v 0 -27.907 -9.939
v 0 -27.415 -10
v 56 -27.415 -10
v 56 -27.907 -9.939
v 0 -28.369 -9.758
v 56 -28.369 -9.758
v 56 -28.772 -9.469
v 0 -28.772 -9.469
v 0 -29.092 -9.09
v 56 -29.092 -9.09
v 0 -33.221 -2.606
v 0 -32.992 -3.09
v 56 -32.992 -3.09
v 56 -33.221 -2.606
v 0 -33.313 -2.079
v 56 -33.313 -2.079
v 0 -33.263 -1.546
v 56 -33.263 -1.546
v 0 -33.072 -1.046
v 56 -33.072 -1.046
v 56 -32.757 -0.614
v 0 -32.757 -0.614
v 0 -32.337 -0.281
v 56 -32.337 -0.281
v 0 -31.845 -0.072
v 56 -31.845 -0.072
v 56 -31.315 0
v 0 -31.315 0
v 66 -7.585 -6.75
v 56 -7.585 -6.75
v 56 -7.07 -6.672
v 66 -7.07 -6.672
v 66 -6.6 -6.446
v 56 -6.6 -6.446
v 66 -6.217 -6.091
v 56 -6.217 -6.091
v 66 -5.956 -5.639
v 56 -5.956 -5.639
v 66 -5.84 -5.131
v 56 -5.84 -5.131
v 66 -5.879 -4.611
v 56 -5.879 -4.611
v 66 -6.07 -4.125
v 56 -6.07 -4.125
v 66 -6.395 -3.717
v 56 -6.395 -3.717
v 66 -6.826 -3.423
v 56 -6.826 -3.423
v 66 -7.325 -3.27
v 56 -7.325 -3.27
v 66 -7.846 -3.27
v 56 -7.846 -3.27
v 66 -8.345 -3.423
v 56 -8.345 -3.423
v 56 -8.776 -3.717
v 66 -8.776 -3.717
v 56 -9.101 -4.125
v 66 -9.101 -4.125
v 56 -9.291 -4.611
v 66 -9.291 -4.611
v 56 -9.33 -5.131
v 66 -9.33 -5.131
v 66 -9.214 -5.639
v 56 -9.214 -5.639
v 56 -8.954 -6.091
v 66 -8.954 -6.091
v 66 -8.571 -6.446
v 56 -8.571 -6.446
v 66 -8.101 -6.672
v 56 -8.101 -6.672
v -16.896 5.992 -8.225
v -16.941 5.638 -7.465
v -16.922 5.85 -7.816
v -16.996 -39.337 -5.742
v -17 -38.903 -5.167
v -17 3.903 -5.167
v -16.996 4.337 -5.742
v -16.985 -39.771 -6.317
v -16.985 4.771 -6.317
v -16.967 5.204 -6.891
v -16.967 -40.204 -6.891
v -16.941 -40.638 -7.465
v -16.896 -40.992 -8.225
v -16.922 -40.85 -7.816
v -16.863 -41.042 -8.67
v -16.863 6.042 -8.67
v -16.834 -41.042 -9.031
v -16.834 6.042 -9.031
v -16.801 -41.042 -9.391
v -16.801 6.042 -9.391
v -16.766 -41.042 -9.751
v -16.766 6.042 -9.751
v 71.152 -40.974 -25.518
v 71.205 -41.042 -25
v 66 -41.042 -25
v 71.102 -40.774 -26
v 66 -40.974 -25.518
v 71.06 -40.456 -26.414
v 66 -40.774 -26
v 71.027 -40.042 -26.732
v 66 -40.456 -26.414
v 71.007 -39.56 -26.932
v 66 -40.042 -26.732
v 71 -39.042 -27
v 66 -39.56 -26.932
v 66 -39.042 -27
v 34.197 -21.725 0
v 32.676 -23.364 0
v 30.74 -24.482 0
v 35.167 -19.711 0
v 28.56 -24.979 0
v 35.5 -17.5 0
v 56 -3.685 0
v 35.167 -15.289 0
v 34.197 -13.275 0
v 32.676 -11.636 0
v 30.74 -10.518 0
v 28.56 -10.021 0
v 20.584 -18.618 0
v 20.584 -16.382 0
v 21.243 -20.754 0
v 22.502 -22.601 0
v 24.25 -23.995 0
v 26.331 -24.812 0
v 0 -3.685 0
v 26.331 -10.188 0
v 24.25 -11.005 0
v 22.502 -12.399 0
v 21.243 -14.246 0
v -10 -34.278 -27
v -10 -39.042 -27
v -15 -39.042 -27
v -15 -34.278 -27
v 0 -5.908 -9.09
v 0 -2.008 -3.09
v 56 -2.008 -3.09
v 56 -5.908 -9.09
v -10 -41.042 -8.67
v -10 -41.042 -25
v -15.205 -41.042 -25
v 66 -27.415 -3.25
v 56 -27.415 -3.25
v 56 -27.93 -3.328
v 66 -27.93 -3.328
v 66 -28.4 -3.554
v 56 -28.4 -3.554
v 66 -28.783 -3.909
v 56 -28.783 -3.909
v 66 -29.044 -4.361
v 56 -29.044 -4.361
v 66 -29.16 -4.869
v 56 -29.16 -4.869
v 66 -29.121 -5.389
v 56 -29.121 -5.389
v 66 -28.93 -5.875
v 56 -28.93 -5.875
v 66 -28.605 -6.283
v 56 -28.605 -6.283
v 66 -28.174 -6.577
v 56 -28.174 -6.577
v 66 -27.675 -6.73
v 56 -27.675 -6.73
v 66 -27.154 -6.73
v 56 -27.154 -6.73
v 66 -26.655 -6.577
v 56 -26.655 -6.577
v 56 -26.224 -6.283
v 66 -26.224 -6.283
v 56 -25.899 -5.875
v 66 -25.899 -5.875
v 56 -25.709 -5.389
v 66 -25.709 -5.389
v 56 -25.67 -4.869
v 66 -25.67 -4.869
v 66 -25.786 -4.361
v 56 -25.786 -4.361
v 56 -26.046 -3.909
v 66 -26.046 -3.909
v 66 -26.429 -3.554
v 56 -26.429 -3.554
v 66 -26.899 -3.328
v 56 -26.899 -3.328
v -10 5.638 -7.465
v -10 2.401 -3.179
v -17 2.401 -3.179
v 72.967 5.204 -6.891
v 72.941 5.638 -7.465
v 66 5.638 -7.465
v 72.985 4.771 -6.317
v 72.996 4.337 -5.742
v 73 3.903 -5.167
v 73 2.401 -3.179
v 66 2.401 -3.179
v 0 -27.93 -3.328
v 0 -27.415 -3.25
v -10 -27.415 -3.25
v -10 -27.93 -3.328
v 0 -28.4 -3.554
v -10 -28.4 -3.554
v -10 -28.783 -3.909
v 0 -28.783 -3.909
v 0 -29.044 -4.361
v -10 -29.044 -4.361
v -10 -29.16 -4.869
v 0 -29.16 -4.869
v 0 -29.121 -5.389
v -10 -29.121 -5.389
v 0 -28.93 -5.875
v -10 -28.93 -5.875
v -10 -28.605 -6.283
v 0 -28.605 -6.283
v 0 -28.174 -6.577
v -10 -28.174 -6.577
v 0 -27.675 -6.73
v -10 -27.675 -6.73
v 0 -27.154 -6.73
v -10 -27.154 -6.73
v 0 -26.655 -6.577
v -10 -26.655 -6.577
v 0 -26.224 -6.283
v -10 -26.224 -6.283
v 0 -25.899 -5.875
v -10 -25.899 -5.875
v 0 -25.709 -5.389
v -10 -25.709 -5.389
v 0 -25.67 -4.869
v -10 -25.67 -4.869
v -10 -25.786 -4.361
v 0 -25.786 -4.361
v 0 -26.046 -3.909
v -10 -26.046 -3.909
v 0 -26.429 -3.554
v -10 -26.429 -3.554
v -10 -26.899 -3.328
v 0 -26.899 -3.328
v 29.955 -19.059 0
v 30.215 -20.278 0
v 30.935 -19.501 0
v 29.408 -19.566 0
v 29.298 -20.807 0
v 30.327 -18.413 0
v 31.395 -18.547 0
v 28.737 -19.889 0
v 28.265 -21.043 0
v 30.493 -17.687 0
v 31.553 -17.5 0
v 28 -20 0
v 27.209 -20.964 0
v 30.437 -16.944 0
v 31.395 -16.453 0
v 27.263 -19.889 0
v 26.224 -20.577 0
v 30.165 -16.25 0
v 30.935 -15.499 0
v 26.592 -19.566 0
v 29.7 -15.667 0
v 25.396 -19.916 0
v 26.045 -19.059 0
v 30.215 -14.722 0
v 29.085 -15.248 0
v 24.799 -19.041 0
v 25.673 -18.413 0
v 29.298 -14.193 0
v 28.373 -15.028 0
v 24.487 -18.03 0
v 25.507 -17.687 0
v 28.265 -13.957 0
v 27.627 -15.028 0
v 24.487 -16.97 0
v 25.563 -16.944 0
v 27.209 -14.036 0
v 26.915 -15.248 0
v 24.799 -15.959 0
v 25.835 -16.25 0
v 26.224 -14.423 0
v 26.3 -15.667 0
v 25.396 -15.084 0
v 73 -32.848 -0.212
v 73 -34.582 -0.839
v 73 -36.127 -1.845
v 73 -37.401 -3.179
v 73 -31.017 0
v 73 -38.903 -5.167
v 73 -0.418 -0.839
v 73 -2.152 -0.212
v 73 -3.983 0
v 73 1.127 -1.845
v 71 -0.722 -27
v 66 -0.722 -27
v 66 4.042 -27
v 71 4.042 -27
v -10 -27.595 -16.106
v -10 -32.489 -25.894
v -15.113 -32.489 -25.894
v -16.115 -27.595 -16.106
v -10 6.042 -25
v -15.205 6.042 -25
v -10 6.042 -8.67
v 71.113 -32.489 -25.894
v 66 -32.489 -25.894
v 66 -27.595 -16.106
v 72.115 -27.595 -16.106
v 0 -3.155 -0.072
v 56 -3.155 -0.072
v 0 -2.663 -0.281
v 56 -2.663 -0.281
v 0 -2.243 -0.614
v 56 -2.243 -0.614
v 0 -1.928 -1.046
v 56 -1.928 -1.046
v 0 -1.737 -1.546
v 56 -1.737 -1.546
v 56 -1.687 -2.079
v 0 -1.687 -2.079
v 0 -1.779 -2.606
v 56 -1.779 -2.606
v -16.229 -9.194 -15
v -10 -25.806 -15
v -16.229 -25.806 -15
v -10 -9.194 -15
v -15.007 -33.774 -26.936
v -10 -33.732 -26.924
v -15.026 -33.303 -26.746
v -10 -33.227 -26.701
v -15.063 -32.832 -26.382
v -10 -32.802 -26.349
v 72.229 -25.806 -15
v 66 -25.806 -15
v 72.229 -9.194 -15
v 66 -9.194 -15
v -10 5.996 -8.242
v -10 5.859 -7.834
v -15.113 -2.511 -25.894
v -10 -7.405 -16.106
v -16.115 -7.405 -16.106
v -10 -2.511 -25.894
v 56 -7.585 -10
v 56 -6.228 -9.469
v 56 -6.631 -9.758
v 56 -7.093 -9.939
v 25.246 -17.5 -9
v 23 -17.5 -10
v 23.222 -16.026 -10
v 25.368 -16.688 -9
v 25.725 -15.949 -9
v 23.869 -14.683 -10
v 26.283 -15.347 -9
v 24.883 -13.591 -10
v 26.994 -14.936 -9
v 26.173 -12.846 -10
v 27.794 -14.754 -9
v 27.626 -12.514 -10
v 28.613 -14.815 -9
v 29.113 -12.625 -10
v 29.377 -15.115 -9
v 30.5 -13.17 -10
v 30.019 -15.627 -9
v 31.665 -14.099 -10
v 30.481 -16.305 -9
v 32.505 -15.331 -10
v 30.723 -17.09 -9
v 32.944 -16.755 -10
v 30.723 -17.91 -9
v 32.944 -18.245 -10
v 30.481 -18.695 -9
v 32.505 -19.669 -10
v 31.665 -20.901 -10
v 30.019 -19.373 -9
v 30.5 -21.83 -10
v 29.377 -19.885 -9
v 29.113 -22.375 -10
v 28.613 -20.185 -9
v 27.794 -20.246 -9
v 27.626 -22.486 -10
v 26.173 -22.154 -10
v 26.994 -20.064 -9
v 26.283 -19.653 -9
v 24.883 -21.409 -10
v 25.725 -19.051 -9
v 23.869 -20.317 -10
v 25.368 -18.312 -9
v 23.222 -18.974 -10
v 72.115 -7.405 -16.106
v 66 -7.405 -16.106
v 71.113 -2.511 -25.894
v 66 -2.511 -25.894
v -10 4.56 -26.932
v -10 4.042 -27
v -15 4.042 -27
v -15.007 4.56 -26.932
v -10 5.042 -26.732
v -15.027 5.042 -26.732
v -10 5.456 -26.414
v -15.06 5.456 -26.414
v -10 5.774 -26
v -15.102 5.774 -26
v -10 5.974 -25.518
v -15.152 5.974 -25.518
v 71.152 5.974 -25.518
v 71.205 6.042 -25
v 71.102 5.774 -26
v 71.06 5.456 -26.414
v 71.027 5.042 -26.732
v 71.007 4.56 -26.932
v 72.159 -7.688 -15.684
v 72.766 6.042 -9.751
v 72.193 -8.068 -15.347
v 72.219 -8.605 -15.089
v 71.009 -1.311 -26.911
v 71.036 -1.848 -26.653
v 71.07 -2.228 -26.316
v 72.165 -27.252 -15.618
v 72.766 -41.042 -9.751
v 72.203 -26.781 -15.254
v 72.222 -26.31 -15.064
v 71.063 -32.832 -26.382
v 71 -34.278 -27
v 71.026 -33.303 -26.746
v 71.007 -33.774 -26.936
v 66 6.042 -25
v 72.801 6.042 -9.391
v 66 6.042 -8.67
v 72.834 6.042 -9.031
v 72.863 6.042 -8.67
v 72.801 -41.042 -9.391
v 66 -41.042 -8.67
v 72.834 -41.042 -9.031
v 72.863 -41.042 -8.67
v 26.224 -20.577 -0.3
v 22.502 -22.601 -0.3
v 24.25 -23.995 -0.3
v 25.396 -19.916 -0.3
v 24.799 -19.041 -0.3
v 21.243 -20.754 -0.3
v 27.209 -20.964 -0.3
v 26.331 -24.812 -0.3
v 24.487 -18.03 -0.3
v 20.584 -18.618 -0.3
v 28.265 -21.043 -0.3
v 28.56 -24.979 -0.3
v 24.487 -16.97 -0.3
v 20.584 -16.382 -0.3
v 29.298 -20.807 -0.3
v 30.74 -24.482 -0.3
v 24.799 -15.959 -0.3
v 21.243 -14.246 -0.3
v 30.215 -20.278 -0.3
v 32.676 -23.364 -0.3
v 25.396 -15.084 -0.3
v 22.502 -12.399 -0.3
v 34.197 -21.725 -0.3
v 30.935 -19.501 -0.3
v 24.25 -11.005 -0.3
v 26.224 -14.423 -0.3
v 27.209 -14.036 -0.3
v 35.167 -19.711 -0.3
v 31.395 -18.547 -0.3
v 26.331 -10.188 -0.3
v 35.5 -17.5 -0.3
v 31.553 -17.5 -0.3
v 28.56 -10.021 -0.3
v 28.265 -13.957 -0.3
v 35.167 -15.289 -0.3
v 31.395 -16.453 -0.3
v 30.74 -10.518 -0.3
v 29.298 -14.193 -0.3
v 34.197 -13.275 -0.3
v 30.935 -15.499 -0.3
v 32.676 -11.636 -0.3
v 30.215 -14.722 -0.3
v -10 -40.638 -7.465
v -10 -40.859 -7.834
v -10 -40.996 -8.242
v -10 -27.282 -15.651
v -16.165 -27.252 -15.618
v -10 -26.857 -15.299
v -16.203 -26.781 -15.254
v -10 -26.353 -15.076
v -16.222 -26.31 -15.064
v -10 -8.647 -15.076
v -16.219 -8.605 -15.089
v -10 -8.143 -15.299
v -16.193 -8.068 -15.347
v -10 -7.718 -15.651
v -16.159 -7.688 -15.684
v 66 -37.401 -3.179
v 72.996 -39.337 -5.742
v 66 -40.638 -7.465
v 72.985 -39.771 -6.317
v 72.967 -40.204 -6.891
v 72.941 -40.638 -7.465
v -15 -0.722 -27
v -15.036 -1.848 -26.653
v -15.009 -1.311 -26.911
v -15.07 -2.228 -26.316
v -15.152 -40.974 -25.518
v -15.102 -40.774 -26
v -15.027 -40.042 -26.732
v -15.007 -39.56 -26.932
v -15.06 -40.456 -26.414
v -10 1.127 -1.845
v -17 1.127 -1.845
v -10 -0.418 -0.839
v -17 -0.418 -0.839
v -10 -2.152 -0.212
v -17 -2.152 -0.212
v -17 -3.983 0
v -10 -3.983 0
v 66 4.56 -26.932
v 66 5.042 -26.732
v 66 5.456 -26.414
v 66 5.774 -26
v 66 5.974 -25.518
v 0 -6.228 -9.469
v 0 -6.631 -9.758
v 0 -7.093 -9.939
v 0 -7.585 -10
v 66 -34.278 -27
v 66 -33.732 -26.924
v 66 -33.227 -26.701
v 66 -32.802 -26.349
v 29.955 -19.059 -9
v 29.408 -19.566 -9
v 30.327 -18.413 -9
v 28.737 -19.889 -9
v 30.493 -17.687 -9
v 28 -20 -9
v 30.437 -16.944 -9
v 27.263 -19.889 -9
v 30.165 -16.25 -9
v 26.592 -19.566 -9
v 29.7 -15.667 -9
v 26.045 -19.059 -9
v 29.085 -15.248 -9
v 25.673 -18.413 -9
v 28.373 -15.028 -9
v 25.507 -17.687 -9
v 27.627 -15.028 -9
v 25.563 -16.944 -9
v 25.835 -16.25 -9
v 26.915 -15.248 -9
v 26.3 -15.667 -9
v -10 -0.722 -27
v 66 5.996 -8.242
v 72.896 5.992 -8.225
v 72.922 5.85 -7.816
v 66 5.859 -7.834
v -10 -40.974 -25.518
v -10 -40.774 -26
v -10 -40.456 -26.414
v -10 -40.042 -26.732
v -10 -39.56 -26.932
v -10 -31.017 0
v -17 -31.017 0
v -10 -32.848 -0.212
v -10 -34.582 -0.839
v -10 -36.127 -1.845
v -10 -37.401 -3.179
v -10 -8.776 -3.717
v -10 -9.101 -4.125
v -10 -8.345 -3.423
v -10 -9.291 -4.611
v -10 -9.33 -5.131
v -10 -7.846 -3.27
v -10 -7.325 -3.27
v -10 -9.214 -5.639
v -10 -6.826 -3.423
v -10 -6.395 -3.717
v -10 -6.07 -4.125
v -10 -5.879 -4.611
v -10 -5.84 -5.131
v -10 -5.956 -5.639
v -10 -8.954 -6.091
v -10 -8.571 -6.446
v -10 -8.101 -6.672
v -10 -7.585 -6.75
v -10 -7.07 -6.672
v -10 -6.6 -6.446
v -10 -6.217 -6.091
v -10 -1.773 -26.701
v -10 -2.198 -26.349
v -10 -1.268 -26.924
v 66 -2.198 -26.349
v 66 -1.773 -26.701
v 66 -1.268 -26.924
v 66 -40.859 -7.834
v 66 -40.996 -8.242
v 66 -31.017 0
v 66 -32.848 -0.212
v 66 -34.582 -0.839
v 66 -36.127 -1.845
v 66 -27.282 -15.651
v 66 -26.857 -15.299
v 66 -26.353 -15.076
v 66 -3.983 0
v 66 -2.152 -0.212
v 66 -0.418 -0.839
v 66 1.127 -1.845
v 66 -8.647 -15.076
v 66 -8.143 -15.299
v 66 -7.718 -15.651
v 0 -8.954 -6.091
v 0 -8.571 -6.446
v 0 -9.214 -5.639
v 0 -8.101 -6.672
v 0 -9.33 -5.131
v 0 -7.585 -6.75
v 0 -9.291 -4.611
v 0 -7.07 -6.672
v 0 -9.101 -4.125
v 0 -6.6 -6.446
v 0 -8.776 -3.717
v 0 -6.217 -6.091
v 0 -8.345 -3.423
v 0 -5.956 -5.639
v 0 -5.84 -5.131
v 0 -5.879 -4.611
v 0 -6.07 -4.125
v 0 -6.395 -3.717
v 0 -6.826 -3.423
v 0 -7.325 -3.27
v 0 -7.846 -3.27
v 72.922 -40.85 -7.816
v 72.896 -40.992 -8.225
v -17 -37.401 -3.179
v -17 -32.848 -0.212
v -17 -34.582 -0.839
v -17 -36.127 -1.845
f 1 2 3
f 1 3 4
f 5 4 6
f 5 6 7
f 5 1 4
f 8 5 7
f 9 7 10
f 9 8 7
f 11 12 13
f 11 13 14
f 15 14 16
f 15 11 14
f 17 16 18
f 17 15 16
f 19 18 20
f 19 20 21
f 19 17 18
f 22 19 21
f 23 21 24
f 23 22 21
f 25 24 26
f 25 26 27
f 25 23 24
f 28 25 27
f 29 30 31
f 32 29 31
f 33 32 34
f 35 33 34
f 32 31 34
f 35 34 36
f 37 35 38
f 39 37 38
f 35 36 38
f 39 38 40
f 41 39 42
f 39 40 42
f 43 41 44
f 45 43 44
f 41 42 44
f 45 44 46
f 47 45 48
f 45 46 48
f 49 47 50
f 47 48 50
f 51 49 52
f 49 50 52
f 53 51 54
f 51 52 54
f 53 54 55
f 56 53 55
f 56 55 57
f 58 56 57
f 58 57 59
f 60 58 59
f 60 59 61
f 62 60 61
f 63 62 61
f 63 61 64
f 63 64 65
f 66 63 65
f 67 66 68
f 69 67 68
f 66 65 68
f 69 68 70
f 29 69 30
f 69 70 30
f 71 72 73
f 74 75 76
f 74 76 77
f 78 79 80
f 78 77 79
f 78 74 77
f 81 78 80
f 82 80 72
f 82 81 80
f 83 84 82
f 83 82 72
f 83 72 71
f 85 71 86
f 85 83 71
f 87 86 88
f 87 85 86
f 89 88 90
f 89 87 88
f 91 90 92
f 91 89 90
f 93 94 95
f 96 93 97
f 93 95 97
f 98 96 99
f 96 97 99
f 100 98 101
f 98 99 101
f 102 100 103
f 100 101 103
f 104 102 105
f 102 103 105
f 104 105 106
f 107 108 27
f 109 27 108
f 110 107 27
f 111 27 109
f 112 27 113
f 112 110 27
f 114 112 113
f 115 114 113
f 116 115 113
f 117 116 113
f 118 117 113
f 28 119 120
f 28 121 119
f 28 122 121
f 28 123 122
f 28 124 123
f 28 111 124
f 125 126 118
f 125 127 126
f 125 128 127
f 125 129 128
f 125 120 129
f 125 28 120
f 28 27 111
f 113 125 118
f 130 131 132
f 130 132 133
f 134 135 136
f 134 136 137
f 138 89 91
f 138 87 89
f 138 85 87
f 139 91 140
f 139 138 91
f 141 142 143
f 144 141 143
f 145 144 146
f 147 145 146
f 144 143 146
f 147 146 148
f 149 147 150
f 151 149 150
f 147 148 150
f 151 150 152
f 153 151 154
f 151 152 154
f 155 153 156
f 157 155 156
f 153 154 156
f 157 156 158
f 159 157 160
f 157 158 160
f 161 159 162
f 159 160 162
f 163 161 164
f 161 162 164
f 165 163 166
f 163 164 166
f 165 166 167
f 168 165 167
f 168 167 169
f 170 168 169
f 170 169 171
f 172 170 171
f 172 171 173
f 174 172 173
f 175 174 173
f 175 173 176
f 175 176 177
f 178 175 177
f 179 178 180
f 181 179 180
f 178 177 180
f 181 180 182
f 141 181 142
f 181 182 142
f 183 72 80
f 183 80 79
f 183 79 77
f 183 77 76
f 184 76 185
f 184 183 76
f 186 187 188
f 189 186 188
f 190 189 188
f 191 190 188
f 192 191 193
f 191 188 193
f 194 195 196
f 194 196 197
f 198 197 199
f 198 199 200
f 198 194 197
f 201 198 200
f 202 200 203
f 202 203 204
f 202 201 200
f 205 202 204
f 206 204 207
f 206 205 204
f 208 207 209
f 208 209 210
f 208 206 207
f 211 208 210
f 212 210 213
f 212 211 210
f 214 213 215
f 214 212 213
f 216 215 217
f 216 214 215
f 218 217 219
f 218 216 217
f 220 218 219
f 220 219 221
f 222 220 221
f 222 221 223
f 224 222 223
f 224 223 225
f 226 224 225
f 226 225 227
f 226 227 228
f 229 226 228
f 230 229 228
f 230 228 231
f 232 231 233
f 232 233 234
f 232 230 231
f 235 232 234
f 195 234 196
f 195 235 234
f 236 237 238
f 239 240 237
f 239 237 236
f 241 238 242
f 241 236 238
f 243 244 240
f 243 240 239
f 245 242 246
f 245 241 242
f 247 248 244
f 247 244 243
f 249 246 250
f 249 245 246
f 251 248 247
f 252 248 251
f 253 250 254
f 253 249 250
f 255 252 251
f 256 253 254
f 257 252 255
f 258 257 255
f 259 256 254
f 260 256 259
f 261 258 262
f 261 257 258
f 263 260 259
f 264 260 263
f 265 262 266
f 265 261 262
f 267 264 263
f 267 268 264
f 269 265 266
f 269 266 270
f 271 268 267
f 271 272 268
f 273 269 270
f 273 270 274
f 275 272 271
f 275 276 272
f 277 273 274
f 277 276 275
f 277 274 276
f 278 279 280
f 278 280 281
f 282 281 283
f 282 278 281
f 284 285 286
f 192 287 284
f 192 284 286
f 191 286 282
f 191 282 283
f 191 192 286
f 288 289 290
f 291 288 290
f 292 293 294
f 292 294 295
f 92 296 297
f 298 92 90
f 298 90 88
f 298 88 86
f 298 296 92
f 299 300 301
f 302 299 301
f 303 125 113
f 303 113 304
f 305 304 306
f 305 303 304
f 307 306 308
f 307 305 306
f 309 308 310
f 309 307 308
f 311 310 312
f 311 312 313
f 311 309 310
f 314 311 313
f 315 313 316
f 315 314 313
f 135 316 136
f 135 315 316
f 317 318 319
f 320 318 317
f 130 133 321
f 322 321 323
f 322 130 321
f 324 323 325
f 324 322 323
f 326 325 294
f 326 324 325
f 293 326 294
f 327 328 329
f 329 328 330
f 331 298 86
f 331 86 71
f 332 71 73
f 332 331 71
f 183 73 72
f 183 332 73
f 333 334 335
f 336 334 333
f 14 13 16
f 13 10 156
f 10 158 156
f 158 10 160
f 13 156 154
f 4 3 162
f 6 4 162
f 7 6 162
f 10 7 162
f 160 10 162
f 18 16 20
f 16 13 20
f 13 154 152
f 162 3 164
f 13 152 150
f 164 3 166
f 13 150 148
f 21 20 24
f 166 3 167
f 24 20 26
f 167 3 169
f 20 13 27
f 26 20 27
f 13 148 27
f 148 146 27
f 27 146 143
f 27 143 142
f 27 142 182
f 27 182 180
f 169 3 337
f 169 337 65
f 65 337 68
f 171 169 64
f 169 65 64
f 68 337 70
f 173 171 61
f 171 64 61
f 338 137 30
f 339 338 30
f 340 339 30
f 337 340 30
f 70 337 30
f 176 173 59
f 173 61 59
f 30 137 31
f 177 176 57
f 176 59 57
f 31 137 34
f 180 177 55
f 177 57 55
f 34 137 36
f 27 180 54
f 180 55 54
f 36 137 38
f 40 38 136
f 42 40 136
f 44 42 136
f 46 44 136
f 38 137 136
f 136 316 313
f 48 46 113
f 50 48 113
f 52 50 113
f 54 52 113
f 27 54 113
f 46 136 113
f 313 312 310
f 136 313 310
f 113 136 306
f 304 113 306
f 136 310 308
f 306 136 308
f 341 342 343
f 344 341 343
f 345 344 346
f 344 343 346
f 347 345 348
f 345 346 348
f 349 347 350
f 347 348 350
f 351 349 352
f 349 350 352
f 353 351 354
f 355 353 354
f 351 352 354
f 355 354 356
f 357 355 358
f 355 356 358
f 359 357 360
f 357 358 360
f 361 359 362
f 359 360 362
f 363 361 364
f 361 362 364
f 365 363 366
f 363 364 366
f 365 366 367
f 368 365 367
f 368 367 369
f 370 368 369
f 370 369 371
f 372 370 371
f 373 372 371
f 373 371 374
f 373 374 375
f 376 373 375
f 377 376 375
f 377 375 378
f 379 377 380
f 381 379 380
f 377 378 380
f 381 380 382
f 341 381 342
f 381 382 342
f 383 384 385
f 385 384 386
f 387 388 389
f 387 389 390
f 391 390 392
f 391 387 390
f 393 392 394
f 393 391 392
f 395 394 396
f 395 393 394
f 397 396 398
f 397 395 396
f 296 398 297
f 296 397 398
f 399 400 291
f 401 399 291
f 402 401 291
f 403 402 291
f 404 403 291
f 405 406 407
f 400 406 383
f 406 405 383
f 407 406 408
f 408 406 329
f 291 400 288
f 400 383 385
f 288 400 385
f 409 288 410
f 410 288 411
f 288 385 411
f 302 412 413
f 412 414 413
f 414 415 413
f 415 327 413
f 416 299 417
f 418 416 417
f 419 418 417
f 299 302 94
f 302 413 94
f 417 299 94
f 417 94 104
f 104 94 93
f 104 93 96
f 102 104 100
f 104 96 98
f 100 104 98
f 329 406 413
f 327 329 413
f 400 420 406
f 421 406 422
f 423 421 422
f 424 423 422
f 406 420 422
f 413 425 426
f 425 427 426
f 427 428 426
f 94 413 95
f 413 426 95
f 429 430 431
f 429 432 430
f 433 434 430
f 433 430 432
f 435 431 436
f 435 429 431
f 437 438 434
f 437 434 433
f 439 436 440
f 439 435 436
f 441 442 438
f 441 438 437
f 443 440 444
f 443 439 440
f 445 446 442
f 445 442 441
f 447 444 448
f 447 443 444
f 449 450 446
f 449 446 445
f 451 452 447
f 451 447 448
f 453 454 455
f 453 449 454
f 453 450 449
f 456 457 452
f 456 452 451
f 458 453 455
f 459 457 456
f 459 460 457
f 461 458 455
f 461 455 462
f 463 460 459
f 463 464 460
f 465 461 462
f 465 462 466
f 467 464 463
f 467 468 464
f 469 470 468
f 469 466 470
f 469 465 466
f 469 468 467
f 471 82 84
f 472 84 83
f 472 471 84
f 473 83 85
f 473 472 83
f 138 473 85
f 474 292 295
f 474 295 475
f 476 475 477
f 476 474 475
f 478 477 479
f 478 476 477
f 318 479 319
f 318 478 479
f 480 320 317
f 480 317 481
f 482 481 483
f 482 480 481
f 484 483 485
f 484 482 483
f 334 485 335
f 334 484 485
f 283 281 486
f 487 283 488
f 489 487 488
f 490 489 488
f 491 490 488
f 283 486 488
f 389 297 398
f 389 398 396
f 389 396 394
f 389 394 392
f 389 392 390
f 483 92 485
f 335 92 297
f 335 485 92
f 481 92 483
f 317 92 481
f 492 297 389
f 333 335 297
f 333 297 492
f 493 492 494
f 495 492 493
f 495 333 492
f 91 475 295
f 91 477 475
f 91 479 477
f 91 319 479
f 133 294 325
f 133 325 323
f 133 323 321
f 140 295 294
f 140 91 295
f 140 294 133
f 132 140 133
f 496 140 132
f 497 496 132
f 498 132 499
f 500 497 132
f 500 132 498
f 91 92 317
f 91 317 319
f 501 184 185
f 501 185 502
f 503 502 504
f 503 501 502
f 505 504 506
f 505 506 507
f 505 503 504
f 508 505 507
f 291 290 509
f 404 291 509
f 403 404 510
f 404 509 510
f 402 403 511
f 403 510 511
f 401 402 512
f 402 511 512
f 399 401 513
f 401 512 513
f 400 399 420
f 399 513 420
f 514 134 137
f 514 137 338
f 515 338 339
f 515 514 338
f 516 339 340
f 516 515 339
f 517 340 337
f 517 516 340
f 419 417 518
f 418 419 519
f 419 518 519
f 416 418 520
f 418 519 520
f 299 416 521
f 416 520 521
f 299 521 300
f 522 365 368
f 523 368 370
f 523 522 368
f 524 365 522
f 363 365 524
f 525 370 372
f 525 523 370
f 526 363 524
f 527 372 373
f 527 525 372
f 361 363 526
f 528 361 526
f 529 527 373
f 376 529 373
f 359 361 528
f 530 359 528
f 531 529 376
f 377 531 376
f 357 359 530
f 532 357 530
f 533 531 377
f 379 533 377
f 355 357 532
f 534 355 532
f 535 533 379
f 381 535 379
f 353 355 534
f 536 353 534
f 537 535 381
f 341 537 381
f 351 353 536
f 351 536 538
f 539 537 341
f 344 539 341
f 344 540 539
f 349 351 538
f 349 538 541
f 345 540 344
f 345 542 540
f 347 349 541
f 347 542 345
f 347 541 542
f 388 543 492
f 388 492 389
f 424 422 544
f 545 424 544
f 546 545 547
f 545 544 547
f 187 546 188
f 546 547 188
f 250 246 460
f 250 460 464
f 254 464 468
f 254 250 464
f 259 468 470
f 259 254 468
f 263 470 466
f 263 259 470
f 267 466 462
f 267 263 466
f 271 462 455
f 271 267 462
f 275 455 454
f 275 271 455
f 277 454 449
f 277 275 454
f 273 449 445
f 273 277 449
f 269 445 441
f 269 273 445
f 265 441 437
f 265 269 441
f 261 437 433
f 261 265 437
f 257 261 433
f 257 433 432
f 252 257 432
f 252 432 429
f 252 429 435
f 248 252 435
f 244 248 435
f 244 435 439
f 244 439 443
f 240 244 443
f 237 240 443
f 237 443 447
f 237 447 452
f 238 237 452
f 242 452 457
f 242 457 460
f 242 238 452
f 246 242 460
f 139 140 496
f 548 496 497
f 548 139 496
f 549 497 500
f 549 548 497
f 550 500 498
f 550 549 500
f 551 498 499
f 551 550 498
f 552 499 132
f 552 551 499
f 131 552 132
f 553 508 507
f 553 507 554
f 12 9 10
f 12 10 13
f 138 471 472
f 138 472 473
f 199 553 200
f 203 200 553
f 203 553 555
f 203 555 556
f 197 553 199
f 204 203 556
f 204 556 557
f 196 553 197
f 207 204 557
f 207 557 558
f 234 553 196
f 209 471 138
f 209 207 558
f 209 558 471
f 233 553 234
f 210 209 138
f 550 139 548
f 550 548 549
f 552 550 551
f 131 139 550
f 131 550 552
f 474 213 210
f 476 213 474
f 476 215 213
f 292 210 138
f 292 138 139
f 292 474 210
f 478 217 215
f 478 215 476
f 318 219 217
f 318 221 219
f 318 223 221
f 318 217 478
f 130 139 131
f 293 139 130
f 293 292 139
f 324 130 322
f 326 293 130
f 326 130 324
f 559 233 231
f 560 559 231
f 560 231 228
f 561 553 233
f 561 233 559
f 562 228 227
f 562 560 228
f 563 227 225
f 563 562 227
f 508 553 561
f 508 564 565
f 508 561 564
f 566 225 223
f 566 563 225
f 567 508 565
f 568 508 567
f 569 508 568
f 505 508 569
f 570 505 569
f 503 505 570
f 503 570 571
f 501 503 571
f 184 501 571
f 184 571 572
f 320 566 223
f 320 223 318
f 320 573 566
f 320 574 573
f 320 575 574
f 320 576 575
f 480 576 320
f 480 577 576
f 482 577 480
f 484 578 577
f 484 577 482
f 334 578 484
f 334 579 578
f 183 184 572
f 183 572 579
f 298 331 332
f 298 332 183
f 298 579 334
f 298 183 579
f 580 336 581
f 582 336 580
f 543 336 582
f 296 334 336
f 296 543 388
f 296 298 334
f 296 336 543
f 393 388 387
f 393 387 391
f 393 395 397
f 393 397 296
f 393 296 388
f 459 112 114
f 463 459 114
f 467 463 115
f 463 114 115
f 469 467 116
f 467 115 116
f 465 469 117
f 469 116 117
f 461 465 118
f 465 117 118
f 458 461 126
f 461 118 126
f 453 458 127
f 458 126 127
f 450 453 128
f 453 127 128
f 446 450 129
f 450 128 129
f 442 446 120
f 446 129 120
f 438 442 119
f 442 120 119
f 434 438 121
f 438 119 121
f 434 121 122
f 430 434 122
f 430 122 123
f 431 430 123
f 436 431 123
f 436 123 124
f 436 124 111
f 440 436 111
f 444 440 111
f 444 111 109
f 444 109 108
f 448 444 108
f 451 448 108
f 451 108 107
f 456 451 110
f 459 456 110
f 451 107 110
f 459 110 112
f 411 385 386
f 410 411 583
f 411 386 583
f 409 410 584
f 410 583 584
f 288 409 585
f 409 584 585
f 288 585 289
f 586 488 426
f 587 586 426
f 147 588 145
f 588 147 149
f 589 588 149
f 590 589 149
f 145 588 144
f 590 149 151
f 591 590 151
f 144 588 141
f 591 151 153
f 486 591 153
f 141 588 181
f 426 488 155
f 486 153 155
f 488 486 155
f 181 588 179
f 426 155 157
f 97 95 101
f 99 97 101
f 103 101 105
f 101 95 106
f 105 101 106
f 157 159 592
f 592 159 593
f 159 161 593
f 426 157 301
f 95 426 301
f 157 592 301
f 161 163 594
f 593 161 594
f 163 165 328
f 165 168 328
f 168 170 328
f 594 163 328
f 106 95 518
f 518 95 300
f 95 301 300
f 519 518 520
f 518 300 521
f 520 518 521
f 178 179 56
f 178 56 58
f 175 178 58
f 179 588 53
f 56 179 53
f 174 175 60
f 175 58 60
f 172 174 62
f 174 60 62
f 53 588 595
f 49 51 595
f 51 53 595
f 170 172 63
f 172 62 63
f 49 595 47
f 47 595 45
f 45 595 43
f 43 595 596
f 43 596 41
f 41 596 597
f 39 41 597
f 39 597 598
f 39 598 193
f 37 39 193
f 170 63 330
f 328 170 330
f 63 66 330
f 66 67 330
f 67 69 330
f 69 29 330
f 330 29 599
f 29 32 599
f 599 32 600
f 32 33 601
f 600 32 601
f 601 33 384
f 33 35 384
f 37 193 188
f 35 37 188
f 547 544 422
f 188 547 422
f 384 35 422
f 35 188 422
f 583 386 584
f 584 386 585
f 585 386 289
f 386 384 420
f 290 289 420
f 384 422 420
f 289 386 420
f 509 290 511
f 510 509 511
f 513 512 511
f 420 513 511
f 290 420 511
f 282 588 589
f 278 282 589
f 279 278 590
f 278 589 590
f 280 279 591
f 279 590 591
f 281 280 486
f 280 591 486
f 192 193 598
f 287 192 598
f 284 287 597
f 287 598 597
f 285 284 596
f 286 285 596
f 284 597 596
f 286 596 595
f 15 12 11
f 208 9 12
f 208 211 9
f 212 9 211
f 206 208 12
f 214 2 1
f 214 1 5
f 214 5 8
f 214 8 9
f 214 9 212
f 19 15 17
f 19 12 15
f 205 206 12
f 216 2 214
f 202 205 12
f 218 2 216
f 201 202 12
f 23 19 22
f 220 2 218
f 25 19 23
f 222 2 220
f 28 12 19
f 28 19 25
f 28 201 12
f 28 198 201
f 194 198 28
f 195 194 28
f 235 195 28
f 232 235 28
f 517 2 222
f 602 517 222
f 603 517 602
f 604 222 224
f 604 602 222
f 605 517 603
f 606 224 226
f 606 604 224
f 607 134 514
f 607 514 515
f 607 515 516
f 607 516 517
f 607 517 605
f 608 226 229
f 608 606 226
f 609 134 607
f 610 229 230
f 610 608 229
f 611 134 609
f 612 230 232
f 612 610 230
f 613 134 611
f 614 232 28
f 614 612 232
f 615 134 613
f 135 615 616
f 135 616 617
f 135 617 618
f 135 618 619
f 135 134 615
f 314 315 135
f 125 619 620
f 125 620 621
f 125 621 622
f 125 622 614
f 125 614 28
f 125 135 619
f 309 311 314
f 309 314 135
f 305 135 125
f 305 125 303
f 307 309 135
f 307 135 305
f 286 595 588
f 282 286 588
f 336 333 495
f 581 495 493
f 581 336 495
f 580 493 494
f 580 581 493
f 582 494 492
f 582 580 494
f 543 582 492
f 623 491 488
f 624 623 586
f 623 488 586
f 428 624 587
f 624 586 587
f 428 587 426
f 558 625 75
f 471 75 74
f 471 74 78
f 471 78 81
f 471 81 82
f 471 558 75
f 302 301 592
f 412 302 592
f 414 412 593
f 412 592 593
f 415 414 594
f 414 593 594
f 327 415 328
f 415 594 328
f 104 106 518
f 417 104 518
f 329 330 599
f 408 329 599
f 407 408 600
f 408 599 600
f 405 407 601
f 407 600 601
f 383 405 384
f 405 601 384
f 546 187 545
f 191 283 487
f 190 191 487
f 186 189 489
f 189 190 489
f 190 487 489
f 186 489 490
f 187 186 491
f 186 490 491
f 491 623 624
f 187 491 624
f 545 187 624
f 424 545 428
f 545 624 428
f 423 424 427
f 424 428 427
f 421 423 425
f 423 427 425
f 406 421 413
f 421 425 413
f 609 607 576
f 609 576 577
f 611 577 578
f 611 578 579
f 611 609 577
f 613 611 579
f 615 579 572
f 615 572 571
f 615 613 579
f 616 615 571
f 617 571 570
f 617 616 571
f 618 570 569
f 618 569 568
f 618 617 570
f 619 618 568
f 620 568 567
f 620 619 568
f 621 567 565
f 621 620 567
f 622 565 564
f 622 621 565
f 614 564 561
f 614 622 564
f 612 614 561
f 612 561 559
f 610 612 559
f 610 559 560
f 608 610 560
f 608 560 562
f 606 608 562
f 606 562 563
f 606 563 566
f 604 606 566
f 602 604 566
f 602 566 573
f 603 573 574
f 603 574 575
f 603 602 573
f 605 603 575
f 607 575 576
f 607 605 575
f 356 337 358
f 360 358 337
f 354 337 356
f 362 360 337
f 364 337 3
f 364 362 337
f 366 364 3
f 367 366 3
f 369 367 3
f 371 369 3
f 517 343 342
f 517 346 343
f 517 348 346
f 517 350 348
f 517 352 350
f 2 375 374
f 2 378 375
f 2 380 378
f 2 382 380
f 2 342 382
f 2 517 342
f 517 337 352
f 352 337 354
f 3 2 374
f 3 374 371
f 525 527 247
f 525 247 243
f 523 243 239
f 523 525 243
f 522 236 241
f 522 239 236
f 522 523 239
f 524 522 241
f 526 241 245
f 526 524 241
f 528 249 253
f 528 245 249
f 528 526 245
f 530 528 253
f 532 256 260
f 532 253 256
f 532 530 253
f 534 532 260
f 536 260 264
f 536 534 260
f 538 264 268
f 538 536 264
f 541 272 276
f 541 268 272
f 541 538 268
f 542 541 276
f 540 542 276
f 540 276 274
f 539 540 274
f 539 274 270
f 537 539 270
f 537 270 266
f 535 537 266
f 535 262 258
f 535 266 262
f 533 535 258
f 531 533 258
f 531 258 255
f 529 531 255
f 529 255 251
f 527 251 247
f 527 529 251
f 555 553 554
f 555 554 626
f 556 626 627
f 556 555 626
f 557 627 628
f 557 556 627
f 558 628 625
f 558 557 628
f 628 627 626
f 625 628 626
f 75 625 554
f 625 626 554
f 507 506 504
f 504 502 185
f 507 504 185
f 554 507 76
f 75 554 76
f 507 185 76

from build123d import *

# Parameters (mm, degrees)
BOSS_EXTRUDE1_DEPTH     = 56
SKETCH2_R               = 1.75
BOSS_EXTRUDE2_DEPTH     = 10
BOSS_EXTRUDE3_DEPTH     = 7
CUT_EXTRUDE1_DEPTH      = 13
CUT_EXTRUDE1_DEPTH_BACK = 44
FILLET1_R               = 45
CUT_EXTRUDE2_DEPTH      = 44
CUT_EXTRUDE2_DEPTH_BACK = 44
SKETCH5_R               = 2.5
SKETCH6_R               = 5
CUT_EXTRUDE3_DEPTH      = 1
CUT_EXTRUDE3_DRAFT      = -66
SKETCH7_R               = 7.5
SKETCH7_R_2             = 3.552716841
CUT_EXTRUDE4_DEPTH      = 0.3


with BuildPart() as part:
    # Sketch1 → Boss-Extrude1 (new body)
    with BuildSketch(Plane(origin=(0, 0, 0), x_dir=(0, 0, -1), z_dir=(1, 0, 0))):
        with BuildLine():
            Line((3.089976701, -2.008484856), (9.089976701, -5.908484856))
            ThreePointArc((9.089976701, -5.908484856), (9.757832956, -6.631420675), (10, -7.585372088))
            Line((10, -7.585372088), (10, -27.414627912))
            ThreePointArc((10, -27.414627912), (9.757832956, -28.368579325), (9.089976701, -29.091515144))
            Line((9.089976701, -29.091515144), (3.089976701, -32.991515144))
            ThreePointArc((3.089976701, -32.991515144), (1.046048587, -33.072460868), (0, -31.314627912))
            Line((0, -31.314627912), (0, -3.685372088))
            ThreePointArc((0, -3.685372088), (1.046048587, -1.927539132), (3.089976701, -2.008484856))
        make_face()
    extrude(amount=BOSS_EXTRUDE1_DEPTH)

    # Sketch2 → Boss-Extrude2 (add)
    with BuildSketch(Plane(origin=(56, 0, 0), x_dir=(0, 0, -1), z_dir=(1, 0, 0))):
        with Locations((5, -7.585372088)):
            Circle(SKETCH2_R)
        with Locations(Location((5, -27.414627912, 0), (0, 0, 180))):
            Circle(SKETCH2_R)
    extrude(amount=BOSS_EXTRUDE2_DEPTH)

    # Sketch3 → Boss-Extrude3 (add)
    with BuildSketch(Plane(origin=(66, 0, 0), x_dir=(0, 0, -1), z_dir=(1, 0, 0))):
        with BuildLine():
            Line((25.894427191, -32.489269358), (16.105572809, -27.594842167))
            ThreePointArc((16.105572809, -27.594842167), (15.298698383, -26.857450009), (15, -25.805987785))
            Line((15, -25.805987785), (15, -9.194012215))
            ThreePointArc((15, -9.194012215), (15.298698383, -8.142549991), (16.105572809, -7.405157833))
            Line((16.105572809, -7.405157833), (25.894427191, -2.510730642))
            ThreePointArc((25.894427191, -2.510730642), (26.701301617, -1.773338484), (27, -0.72187626))
            Line((27, -0.72187626), (27, 4.042055763))
            ThreePointArc((27, 4.042055763), (26.414213562, 5.456269325), (25, 6.042055763))
            Line((25, 6.042055763), (8.670397624, 6.042055763))
            ThreePointArc((8.670397624, 6.042055763), (8.034759221, 5.938358434), (7.465034823, 5.638019584))
            Line((7.465034823, 5.638019584), (3.178548798, 2.400621135))
            ThreePointArc((3.178548798, 2.400621135), (0.838589189, -0.417537137), (0, -3.98323415))
            Line((0, -3.98323415), (0, -31.01676585))
            ThreePointArc((0, -31.01676585), (0.838589189, -34.582462863), (3.178548798, -37.400621135))
            Line((3.178548798, -37.400621135), (7.465034823, -40.638019584))
            ThreePointArc((7.465034823, -40.638019584), (8.034759221, -40.938358434), (8.670397624, -41.042055763))
            Line((8.670397624, -41.042055763), (25, -41.042055763))
            ThreePointArc((25, -41.042055763), (26.414213562, -40.456269325), (27, -39.042055763))
            Line((27, -39.042055763), (27, -34.27812374))
            ThreePointArc((27, -34.27812374), (26.701301617, -33.226661516), (25.894427191, -32.489269358))
        make_face()
    extrude(amount=BOSS_EXTRUDE3_DEPTH)

    # Sketch4 → Cut-Extrude1 (cut, two sides: drawn at the far end of the back side and taken through both)
    with BuildSketch(Plane(origin=(0, 0, 0), x_dir=(1, 0, 0), z_dir=(0, 1, 0)).offset(-CUT_EXTRUDE1_DEPTH_BACK)):
        Polygon((73, 7.465034823), (71, 27), (73.488916827, 29.217701415), (75.731950279, 28.881788193), (75.634427086, 22.987052936), (74.610433553, 7.640140994), align=None)
    extrude(amount=CUT_EXTRUDE1_DEPTH + CUT_EXTRUDE1_DEPTH_BACK, mode=Mode.SUBTRACT)

    # Fillet1
    # the kernel refuses this fillet: 45 mm, written as the material it takes off along each edge
    with BuildSketch(Plane(origin=(73, -46.381911836, -7.465034823), x_dir=(0, 0, 1), z_dir=(0, 1, 0))) as fillet1_piece_1:
        with BuildLine():
            CenterArc((FILLET1_R * 0.0510568200202, -FILLET1_R), FILLET1_R, 90, 5.845604693)
            Line((-FILLET1_R * 0.0507913223976, -FILLET1_R * 0.00520004227682), (0, 0))
            Line((0, 0), (FILLET1_R * 0.0510568200202, 0))
        make_face()
    extrude(amount=57.763823673, mode=Mode.SUBTRACT)

    # Mirror1: part across plane


with BuildPart() as part_1:
    add(part.part)
    add(part.part.mirror(Plane(origin=(28, 0, 0), x_dir=(0, 0, 1), z_dir=(1, 0, 0))))

    # Sketch5 → Cut-Extrude2 (cut, two sides: drawn at the far end of the back side and taken through both)
    with BuildSketch(Plane.XY.offset(-CUT_EXTRUDE2_DEPTH_BACK)):
        with Locations(Location((28, -17.5, 0), (0, 0, 270))):
            Circle(SKETCH5_R)
    extrude(amount=CUT_EXTRUDE2_DEPTH + CUT_EXTRUDE2_DEPTH_BACK, mode=Mode.SUBTRACT)


with BuildPart() as cut_extrude3_tool:
    # Sketch6 → Cut-Extrude3 (with draft: the straight prism first)
    with BuildSketch(Plane(origin=(0, 0, -10), x_dir=(-1, 0, 0), z_dir=(0, 0, -1))):
        with Locations((-28, -17.5)):
            Circle(SKETCH6_R)
    extrude(amount=-CUT_EXTRUDE3_DEPTH)
    # Cut-Extrude3: the draft: its side faces are tilted about the plane it starts from
    cut_extrude3_sides = [cut_extrude3_tool.faces().sort_by_distance(p)[0] for p in [
        (33, -17.5, -9.5),
    ]]
    draft(cut_extrude3_sides, Plane(origin=(0, 0, -10), x_dir=(-1, 0, 0), z_dir=(0, 0, -1)), CUT_EXTRUDE3_DRAFT)


with BuildPart() as part_2:
    add(part_1.part)

    # Cut-Extrude3: cut by cut_extrude3_tool
    add(cut_extrude3_tool.part, mode=Mode.SUBTRACT)

    # Sketch7 → Cut-Extrude4 (cut)
    with BuildSketch(Plane.XY):
        with Locations((28, -17.5)):
            Circle(SKETCH7_R)
        with Locations((28, -17.5)):
            Circle(SKETCH7_R_2, mode=Mode.SUBTRACT)
    extrude(amount=-CUT_EXTRUDE4_DEPTH, mode=Mode.SUBTRACT)


solid = part_2.part
